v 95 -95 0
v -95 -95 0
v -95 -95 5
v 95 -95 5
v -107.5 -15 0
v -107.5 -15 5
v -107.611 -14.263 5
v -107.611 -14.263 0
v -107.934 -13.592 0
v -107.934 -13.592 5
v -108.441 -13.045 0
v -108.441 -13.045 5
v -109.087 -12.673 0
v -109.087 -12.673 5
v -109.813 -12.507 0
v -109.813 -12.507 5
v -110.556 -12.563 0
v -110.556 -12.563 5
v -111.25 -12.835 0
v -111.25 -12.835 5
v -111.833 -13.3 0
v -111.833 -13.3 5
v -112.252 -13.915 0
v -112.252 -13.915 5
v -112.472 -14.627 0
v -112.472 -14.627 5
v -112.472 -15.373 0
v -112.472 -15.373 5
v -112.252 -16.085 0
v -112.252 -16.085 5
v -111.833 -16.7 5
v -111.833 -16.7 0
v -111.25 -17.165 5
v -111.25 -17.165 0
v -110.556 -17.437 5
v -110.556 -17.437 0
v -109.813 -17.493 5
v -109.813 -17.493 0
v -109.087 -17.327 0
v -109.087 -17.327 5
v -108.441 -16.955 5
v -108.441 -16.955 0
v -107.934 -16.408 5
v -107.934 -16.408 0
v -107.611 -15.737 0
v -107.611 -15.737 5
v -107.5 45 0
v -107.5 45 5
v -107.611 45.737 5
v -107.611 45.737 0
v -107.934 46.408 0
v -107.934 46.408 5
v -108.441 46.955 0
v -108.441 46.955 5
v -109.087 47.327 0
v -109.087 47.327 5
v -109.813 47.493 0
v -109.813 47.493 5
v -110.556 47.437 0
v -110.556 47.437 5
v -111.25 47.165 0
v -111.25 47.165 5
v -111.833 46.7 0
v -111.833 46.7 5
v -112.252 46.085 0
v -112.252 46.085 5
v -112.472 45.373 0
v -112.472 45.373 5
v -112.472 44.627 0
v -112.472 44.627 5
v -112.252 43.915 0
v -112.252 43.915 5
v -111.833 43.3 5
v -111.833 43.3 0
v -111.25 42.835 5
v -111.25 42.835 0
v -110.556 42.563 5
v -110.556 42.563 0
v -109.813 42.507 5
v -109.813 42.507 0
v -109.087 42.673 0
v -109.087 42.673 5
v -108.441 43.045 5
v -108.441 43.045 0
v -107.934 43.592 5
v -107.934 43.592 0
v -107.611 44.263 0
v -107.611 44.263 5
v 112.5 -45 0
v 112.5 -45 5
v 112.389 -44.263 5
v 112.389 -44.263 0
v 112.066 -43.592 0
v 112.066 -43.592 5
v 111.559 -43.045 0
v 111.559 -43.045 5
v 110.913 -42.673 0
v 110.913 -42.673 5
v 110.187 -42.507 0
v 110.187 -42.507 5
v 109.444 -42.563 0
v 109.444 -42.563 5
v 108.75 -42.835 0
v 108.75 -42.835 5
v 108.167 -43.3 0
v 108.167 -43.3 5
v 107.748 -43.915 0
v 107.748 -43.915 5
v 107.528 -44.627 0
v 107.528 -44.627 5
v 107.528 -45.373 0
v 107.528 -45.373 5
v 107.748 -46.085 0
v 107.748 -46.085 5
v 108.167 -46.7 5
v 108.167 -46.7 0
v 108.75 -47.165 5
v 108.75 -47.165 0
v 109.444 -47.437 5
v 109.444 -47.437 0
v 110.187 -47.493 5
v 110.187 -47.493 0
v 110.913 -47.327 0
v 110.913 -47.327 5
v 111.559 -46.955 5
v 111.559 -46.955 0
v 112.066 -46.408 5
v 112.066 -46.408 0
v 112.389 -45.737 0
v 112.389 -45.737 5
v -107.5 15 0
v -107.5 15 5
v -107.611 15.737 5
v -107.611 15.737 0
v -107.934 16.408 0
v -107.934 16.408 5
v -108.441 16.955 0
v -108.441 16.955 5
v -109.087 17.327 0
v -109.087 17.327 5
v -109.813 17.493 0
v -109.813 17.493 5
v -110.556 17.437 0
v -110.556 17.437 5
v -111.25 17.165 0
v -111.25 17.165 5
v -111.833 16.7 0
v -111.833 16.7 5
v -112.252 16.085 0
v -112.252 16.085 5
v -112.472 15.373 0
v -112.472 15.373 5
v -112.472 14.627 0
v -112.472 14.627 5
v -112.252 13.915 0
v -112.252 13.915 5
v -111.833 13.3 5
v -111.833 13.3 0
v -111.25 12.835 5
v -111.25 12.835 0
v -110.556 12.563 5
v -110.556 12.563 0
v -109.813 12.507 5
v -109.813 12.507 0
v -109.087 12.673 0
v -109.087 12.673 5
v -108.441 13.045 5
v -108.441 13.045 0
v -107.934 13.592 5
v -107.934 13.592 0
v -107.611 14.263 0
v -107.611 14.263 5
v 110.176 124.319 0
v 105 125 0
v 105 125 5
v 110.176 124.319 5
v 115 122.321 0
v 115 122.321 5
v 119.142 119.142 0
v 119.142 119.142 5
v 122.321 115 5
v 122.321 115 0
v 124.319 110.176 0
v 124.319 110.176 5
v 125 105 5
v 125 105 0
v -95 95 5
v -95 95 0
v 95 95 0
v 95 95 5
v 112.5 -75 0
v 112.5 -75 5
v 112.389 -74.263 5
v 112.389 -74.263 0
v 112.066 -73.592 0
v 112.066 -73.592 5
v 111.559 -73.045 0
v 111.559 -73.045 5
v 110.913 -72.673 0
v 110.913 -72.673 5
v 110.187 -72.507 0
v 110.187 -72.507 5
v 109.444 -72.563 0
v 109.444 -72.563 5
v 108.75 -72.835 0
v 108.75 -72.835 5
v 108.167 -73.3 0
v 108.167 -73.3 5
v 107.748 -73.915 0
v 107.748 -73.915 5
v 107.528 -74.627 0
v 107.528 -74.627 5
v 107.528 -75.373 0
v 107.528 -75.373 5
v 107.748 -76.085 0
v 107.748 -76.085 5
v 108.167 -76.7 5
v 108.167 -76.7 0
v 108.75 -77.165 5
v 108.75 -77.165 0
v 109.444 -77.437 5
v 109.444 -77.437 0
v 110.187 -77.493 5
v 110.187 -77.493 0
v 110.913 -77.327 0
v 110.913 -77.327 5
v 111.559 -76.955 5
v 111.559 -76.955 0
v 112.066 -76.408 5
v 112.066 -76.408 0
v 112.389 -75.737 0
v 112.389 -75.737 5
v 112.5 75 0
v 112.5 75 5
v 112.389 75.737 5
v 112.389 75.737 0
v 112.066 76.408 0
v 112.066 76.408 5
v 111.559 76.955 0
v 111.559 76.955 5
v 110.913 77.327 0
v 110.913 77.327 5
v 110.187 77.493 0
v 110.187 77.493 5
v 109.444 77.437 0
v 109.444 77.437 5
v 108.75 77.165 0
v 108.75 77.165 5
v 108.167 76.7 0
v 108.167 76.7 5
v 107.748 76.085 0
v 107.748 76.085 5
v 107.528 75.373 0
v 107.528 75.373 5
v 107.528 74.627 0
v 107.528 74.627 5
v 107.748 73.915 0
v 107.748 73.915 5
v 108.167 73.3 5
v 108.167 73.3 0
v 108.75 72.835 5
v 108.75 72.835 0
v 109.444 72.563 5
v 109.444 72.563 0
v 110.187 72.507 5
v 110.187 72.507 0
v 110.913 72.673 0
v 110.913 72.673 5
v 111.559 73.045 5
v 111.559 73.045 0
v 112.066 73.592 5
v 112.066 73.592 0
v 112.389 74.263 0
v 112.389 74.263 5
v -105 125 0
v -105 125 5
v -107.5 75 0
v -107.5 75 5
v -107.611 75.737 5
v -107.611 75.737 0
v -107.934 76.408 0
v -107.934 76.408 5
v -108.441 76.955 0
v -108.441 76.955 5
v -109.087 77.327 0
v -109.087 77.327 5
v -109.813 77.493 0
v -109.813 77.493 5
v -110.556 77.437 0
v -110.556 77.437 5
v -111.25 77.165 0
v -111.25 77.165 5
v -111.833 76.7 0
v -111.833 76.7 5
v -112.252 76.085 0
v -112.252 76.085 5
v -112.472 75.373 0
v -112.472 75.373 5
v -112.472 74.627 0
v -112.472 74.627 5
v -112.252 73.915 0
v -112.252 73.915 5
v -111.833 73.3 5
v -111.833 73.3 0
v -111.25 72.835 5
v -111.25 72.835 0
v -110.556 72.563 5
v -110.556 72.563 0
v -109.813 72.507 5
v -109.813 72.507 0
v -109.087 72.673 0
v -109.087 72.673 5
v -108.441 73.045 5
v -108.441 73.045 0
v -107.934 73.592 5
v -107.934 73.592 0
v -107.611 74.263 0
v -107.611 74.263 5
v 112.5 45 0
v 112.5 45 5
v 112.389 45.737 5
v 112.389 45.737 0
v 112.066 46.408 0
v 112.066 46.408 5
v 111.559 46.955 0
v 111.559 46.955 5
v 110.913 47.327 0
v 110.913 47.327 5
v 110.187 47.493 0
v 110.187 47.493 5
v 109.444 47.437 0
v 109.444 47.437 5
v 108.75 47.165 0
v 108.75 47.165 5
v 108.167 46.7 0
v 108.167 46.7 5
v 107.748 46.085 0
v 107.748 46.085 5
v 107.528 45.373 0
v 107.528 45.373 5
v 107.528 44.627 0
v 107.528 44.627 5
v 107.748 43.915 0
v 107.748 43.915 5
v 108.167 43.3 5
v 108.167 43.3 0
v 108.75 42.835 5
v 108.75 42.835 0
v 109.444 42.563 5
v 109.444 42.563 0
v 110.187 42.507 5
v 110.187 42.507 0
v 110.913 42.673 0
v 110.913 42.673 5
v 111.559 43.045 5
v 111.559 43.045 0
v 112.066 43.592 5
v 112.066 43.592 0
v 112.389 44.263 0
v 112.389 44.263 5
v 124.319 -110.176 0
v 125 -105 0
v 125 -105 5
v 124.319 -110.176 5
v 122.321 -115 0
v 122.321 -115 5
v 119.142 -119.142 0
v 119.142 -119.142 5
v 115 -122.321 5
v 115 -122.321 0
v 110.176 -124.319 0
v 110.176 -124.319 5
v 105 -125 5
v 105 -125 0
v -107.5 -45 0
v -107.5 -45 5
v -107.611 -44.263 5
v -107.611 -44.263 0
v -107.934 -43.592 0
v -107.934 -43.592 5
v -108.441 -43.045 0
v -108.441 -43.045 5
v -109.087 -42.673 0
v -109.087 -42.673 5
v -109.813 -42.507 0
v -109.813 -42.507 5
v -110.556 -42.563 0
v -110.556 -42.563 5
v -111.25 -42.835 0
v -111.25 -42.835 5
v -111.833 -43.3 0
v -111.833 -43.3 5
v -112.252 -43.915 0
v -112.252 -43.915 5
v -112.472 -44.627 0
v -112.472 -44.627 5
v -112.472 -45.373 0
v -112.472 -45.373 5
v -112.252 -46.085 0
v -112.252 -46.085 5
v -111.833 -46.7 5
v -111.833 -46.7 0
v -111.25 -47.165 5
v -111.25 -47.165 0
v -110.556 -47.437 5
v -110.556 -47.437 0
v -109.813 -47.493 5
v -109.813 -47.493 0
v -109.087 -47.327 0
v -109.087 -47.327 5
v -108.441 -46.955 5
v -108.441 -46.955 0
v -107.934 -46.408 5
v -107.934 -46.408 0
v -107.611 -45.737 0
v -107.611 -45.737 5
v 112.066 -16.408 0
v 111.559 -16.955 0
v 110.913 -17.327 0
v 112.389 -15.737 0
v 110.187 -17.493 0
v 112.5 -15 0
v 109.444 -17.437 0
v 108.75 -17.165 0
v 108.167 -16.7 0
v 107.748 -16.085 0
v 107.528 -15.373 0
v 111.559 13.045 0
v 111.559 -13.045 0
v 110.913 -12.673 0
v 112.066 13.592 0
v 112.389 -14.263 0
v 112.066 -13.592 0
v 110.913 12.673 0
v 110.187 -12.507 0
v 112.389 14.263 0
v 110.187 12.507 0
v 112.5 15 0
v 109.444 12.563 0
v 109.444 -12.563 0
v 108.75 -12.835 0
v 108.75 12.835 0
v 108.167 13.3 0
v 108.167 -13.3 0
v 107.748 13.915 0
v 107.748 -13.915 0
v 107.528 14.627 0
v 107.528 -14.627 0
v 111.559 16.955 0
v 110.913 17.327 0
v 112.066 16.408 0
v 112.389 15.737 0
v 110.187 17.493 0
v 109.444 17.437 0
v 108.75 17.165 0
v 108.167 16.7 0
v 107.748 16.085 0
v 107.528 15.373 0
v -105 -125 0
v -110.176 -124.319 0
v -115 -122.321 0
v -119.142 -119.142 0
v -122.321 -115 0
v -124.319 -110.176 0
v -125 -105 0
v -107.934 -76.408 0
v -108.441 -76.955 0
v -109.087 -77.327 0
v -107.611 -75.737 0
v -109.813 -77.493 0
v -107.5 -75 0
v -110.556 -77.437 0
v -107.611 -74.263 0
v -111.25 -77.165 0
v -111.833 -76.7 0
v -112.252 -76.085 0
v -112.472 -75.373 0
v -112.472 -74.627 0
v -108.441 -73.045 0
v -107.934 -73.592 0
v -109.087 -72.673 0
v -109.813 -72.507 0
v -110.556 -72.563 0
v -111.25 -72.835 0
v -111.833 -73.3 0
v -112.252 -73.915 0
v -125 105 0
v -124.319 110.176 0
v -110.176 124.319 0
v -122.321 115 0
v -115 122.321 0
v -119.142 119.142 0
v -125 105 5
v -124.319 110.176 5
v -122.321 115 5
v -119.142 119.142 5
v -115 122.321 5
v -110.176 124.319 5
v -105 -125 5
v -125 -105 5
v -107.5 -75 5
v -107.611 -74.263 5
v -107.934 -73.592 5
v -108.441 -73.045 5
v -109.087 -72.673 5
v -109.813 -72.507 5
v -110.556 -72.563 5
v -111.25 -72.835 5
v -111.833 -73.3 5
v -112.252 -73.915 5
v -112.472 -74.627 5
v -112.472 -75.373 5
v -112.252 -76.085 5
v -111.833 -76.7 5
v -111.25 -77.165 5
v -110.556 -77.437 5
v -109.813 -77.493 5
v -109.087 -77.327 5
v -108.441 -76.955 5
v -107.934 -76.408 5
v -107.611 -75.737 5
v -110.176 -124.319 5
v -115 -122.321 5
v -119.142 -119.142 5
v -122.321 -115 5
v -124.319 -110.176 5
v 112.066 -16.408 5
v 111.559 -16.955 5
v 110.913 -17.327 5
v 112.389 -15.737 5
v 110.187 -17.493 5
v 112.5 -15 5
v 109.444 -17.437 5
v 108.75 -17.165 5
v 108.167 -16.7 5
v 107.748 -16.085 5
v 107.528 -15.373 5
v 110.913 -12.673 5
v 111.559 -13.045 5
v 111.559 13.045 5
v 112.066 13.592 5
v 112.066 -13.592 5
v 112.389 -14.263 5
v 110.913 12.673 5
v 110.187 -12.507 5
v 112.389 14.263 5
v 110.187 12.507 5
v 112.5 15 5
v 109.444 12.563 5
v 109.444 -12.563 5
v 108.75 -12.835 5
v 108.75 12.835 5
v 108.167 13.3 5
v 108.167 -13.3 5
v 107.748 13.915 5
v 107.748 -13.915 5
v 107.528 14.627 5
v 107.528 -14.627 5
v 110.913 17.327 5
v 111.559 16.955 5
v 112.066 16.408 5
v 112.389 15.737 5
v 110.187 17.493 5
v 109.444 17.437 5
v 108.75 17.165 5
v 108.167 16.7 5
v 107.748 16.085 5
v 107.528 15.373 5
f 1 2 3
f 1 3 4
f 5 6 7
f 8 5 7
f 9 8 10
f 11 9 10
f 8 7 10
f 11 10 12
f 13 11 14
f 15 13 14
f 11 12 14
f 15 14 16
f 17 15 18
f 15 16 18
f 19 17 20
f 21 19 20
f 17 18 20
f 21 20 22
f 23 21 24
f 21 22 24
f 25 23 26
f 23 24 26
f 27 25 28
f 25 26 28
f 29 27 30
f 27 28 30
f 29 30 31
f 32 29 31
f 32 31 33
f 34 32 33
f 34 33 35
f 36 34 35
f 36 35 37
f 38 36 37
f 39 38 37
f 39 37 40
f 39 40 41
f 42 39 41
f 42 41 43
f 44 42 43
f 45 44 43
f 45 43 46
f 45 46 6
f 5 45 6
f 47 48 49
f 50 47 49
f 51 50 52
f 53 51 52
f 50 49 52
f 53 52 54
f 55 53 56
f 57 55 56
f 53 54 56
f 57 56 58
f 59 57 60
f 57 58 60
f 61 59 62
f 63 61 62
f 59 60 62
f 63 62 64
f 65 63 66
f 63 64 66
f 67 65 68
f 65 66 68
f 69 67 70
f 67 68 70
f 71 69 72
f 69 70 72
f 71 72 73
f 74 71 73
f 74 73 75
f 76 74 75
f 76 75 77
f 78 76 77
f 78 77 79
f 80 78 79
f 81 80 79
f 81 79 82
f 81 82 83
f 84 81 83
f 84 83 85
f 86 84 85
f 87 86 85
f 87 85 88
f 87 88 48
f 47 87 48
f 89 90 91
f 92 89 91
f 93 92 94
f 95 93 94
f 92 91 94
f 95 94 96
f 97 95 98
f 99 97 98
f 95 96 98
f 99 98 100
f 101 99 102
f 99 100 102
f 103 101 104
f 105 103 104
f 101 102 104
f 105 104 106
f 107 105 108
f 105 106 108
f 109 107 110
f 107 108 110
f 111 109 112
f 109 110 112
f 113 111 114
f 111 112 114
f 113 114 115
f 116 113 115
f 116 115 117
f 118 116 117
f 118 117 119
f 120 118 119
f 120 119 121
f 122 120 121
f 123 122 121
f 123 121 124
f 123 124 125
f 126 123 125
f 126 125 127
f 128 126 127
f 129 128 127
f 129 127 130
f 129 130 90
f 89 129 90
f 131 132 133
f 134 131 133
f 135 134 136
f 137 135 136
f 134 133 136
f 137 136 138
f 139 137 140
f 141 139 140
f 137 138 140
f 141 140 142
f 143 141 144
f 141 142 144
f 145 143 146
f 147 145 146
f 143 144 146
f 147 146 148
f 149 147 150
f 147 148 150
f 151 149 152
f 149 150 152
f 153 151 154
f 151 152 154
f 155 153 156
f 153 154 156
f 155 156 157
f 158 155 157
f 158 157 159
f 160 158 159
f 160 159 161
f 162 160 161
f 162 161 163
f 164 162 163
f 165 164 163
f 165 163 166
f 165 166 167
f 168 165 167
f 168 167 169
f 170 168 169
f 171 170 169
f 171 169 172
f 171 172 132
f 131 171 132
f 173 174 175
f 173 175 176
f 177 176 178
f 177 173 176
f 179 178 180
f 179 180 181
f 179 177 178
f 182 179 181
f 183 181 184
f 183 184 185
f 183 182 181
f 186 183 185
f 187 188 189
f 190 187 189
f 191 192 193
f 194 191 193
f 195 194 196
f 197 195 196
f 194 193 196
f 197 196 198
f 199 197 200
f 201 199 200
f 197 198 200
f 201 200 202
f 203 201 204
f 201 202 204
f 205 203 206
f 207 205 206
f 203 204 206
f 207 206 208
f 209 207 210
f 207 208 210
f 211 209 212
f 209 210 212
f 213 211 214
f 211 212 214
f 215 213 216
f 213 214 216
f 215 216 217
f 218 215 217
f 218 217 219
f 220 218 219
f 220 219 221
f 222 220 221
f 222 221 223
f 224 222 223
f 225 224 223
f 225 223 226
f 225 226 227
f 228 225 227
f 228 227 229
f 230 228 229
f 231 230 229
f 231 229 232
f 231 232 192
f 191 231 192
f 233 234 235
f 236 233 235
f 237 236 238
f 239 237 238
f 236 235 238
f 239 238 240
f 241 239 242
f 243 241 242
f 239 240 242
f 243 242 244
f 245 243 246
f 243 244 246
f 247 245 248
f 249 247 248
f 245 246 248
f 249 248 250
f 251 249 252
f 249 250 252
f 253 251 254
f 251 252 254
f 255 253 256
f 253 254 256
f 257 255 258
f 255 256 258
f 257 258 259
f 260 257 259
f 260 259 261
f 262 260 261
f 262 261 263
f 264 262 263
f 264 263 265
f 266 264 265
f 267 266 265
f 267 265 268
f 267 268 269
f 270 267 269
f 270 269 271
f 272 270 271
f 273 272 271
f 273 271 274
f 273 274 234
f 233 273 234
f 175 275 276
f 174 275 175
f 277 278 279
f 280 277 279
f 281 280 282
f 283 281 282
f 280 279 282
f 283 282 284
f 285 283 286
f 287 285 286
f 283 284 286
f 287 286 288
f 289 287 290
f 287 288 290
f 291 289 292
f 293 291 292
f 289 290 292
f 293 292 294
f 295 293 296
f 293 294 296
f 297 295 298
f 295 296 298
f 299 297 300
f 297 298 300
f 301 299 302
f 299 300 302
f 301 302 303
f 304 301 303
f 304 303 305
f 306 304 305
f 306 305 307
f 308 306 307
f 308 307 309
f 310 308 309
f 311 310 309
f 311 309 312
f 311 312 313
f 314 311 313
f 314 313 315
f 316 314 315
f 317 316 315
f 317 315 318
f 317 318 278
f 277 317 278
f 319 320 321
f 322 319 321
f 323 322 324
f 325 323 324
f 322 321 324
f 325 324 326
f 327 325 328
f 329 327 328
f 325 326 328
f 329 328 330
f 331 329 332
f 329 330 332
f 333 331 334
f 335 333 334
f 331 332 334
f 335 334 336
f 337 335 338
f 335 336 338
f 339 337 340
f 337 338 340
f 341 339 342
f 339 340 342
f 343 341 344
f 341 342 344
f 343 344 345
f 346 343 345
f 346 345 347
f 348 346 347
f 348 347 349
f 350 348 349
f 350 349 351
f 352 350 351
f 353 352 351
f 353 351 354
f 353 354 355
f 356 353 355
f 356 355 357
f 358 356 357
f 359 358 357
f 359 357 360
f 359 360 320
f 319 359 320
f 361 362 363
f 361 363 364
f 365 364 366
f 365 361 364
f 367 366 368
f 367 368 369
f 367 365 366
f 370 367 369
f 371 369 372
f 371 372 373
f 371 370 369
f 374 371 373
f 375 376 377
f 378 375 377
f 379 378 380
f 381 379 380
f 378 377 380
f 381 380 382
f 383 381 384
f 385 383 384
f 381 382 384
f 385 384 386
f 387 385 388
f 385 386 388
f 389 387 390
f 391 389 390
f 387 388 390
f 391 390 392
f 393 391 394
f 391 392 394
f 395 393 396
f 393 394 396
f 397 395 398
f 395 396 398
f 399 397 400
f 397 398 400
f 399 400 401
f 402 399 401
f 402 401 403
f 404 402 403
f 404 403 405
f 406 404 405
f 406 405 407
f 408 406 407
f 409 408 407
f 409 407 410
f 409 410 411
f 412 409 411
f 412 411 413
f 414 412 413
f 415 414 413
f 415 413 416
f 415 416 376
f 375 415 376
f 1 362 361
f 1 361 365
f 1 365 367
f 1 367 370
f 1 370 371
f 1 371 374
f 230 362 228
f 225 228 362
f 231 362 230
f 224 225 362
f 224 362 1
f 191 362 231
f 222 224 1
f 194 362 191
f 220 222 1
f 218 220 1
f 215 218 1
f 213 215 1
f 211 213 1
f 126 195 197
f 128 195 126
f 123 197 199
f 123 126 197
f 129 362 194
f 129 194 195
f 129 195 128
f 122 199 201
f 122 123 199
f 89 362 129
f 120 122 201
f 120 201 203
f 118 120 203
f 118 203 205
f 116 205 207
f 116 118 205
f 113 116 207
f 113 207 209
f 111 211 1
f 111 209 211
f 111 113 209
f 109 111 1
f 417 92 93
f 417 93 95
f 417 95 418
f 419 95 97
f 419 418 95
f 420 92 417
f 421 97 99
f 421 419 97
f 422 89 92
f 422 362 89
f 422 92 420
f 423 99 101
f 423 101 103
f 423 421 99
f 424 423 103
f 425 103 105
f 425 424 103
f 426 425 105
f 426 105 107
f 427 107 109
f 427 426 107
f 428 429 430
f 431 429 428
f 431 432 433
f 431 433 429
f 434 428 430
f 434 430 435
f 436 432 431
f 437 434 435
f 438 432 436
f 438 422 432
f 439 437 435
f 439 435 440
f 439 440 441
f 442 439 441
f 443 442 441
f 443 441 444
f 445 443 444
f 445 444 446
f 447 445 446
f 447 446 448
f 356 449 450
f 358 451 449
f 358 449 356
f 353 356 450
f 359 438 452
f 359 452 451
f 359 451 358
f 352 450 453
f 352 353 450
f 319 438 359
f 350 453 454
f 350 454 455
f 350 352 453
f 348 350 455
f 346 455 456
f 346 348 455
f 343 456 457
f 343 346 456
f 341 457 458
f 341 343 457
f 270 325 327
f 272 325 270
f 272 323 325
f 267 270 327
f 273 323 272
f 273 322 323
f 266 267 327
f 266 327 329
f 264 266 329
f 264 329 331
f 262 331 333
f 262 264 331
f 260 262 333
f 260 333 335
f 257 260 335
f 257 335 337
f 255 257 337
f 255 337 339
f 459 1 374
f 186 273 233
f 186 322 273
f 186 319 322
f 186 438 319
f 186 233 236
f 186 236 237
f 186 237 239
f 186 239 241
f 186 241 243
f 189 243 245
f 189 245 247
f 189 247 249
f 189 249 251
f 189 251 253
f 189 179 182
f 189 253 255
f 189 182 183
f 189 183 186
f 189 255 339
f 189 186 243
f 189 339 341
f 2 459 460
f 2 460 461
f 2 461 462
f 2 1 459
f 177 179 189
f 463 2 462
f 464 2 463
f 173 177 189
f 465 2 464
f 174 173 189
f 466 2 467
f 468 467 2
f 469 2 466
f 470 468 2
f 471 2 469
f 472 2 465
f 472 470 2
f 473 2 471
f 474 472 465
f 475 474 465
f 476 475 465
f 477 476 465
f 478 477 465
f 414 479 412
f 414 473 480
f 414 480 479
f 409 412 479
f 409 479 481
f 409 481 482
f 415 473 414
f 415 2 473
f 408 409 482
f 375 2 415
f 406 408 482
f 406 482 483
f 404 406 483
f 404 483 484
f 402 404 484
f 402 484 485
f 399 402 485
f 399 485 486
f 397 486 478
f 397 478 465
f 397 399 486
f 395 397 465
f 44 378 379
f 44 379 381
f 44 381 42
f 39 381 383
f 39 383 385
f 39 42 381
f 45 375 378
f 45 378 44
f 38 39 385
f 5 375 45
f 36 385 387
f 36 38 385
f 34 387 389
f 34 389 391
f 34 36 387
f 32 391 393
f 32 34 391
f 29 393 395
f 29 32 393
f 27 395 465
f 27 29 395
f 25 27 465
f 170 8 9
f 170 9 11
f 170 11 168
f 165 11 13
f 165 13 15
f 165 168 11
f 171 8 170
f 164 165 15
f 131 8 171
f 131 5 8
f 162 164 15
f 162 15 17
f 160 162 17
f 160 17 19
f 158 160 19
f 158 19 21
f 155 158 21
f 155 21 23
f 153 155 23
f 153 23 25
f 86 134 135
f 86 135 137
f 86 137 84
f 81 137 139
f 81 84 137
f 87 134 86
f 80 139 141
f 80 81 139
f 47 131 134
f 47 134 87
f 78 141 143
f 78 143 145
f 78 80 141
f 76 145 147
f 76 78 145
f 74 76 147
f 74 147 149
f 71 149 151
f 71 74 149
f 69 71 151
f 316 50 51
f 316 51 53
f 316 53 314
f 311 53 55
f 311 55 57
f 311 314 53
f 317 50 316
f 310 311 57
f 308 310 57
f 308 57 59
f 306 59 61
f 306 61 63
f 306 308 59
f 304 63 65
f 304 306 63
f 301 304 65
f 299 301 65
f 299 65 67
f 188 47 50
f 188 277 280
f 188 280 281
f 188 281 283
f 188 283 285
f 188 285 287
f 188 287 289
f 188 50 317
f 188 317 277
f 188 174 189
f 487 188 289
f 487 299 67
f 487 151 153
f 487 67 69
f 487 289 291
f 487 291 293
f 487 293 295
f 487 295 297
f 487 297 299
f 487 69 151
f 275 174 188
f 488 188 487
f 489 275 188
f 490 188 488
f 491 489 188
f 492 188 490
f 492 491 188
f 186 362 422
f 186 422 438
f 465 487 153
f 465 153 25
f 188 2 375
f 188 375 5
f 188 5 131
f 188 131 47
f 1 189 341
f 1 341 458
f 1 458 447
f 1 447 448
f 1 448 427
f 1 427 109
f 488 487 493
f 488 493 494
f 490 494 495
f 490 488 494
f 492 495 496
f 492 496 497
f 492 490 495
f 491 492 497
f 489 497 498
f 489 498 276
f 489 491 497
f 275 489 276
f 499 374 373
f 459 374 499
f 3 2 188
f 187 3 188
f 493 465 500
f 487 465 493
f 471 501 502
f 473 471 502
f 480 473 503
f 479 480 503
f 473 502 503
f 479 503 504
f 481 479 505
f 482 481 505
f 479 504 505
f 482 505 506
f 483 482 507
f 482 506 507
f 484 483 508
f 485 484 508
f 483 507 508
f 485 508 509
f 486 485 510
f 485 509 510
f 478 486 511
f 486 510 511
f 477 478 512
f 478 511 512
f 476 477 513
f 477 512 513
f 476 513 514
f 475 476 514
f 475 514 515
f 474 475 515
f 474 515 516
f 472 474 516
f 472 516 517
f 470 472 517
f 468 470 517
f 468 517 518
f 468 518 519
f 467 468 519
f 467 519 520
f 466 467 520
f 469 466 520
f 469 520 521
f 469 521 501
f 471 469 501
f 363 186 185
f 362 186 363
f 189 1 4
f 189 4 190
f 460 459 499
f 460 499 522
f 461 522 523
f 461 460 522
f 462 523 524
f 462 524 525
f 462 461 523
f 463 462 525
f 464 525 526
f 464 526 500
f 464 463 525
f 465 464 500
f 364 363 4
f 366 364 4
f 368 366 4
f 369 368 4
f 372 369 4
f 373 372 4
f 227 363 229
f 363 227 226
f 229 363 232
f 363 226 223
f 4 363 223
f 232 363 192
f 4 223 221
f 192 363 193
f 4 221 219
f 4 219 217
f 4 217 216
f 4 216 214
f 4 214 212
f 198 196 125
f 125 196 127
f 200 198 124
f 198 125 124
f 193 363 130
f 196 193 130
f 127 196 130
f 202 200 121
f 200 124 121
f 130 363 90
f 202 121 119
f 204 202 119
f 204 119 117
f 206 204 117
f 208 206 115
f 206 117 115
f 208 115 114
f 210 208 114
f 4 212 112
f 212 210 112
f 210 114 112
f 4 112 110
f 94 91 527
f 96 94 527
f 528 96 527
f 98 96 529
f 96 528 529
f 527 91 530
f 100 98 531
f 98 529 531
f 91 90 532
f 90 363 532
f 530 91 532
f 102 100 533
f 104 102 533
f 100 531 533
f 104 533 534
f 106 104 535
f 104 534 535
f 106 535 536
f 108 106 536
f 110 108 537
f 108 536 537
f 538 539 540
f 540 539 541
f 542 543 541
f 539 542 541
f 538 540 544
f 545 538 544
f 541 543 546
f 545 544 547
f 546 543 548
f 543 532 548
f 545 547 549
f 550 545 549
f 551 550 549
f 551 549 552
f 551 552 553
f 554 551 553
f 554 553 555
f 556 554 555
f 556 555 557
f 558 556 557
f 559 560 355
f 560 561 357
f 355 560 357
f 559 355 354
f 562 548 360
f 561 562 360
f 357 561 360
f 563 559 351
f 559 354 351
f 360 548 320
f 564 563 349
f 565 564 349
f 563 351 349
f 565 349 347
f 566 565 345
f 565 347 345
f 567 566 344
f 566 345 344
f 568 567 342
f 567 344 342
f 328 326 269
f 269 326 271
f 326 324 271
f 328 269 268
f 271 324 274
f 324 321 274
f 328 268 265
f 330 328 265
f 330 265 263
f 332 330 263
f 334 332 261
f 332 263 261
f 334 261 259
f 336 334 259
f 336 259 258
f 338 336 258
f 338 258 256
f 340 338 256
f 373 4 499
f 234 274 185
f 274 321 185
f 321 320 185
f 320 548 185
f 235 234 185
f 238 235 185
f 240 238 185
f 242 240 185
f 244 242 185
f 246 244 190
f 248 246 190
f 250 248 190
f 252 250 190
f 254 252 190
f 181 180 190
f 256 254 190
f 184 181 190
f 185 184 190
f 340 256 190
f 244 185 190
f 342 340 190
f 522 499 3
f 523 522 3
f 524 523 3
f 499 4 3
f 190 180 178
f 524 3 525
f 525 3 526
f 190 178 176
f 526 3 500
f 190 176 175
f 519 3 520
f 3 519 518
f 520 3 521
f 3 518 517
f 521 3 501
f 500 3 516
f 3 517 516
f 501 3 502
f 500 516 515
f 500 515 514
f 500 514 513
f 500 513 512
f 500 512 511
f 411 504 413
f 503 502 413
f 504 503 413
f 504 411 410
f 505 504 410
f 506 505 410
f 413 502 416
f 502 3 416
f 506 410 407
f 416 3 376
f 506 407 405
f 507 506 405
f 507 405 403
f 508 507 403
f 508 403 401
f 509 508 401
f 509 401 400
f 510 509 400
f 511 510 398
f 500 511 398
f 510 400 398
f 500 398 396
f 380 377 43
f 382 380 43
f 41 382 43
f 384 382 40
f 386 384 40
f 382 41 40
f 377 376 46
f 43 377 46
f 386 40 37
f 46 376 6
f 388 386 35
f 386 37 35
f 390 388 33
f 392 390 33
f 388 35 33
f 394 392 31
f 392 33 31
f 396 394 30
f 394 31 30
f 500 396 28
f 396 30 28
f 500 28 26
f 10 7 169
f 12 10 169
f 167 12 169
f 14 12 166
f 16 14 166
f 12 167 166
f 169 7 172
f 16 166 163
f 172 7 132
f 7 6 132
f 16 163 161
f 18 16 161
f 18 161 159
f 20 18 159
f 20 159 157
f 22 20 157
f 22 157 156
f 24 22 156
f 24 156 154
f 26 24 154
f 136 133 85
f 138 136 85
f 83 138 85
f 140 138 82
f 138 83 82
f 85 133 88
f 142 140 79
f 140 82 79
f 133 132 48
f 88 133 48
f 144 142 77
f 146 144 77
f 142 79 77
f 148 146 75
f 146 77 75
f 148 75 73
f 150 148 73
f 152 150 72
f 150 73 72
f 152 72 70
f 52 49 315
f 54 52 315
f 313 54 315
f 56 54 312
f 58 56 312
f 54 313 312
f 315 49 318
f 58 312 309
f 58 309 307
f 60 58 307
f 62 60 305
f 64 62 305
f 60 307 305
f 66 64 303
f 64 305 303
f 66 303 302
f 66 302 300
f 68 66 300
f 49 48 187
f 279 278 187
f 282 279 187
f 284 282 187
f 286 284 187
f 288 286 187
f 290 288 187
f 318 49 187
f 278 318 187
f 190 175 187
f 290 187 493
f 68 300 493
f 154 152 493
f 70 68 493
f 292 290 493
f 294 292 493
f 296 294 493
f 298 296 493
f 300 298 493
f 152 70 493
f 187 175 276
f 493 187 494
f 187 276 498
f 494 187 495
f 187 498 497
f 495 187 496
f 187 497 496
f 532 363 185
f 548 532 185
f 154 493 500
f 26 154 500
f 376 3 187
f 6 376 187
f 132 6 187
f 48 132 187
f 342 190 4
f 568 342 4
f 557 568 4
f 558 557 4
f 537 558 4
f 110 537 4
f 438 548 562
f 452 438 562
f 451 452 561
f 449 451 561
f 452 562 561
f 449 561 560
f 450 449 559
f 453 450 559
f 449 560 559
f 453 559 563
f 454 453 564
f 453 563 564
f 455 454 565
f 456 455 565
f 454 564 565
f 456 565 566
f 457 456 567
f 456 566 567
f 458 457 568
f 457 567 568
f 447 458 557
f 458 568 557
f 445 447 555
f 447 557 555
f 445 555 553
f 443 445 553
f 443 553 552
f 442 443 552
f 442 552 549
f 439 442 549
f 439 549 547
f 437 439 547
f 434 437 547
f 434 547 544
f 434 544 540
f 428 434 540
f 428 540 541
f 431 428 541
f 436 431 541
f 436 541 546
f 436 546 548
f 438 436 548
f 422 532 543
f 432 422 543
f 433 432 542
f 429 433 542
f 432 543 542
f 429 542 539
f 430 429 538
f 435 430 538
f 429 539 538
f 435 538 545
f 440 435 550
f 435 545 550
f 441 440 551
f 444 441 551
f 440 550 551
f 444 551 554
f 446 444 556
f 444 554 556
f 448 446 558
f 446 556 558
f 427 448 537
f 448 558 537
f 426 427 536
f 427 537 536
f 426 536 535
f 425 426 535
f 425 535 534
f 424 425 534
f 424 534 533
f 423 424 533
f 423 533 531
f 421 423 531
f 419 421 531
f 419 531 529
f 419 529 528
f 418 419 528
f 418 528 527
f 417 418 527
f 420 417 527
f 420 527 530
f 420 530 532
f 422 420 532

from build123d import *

# Parameters (mm, degrees)
SKETCH1_W           = 190
SKETCH1_H           = 190
BOSS_EXTRUDE1_DEPTH = 5
SKETCH2_R           = 2.5
CUT_EXTRUDE1_DEPTH  = 177.847391838
LPATTERN1_COUNT     = 6
LPATTERN1_PITCH     = 30


with BuildPart() as part:
    # Sketch1 → Boss-Extrude1 (new body)
    with BuildSketch(Plane.XY):
        with BuildLine():
            Line((-105, 125), (105, 125))
            ThreePointArc((105, 125), (119.142135624, 119.142135624), (125, 105))
            Line((125, 105), (125, -105))
            ThreePointArc((125, -105), (119.142135624, -119.142135624), (105, -125))
            Line((105, -125), (-105, -125))
            ThreePointArc((-105, -125), (-119.142135624, -119.142135624), (-125, -105))
            Line((-125, -105), (-125, 105))
            ThreePointArc((-125, 105), (-119.142135624, 119.142135624), (-105, 125))
        make_face()
        Rectangle(SKETCH1_W, SKETCH1_H, mode=Mode.SUBTRACT)
    extrude(amount=BOSS_EXTRUDE1_DEPTH)

    # Sketch2 → Cut-Extrude1 (cut, through all)
    with BuildSketch(Plane.XY.offset(5)):
        with Locations((-110, 75)):
            Circle(SKETCH2_R)
        with Locations((110, 75)):
            Circle(SKETCH2_R)
    cut_extrude1 = extrude(amount=-CUT_EXTRUDE1_DEPTH, mode=Mode.SUBTRACT)

    # LPattern1: Cut-Extrude1 ×6
    with Locations(*[(0, -i * LPATTERN1_PITCH, 0) for i in range(1, LPATTERN1_COUNT)]):
        add(cut_extrude1, mode=Mode.SUBTRACT)


solid = part.part
